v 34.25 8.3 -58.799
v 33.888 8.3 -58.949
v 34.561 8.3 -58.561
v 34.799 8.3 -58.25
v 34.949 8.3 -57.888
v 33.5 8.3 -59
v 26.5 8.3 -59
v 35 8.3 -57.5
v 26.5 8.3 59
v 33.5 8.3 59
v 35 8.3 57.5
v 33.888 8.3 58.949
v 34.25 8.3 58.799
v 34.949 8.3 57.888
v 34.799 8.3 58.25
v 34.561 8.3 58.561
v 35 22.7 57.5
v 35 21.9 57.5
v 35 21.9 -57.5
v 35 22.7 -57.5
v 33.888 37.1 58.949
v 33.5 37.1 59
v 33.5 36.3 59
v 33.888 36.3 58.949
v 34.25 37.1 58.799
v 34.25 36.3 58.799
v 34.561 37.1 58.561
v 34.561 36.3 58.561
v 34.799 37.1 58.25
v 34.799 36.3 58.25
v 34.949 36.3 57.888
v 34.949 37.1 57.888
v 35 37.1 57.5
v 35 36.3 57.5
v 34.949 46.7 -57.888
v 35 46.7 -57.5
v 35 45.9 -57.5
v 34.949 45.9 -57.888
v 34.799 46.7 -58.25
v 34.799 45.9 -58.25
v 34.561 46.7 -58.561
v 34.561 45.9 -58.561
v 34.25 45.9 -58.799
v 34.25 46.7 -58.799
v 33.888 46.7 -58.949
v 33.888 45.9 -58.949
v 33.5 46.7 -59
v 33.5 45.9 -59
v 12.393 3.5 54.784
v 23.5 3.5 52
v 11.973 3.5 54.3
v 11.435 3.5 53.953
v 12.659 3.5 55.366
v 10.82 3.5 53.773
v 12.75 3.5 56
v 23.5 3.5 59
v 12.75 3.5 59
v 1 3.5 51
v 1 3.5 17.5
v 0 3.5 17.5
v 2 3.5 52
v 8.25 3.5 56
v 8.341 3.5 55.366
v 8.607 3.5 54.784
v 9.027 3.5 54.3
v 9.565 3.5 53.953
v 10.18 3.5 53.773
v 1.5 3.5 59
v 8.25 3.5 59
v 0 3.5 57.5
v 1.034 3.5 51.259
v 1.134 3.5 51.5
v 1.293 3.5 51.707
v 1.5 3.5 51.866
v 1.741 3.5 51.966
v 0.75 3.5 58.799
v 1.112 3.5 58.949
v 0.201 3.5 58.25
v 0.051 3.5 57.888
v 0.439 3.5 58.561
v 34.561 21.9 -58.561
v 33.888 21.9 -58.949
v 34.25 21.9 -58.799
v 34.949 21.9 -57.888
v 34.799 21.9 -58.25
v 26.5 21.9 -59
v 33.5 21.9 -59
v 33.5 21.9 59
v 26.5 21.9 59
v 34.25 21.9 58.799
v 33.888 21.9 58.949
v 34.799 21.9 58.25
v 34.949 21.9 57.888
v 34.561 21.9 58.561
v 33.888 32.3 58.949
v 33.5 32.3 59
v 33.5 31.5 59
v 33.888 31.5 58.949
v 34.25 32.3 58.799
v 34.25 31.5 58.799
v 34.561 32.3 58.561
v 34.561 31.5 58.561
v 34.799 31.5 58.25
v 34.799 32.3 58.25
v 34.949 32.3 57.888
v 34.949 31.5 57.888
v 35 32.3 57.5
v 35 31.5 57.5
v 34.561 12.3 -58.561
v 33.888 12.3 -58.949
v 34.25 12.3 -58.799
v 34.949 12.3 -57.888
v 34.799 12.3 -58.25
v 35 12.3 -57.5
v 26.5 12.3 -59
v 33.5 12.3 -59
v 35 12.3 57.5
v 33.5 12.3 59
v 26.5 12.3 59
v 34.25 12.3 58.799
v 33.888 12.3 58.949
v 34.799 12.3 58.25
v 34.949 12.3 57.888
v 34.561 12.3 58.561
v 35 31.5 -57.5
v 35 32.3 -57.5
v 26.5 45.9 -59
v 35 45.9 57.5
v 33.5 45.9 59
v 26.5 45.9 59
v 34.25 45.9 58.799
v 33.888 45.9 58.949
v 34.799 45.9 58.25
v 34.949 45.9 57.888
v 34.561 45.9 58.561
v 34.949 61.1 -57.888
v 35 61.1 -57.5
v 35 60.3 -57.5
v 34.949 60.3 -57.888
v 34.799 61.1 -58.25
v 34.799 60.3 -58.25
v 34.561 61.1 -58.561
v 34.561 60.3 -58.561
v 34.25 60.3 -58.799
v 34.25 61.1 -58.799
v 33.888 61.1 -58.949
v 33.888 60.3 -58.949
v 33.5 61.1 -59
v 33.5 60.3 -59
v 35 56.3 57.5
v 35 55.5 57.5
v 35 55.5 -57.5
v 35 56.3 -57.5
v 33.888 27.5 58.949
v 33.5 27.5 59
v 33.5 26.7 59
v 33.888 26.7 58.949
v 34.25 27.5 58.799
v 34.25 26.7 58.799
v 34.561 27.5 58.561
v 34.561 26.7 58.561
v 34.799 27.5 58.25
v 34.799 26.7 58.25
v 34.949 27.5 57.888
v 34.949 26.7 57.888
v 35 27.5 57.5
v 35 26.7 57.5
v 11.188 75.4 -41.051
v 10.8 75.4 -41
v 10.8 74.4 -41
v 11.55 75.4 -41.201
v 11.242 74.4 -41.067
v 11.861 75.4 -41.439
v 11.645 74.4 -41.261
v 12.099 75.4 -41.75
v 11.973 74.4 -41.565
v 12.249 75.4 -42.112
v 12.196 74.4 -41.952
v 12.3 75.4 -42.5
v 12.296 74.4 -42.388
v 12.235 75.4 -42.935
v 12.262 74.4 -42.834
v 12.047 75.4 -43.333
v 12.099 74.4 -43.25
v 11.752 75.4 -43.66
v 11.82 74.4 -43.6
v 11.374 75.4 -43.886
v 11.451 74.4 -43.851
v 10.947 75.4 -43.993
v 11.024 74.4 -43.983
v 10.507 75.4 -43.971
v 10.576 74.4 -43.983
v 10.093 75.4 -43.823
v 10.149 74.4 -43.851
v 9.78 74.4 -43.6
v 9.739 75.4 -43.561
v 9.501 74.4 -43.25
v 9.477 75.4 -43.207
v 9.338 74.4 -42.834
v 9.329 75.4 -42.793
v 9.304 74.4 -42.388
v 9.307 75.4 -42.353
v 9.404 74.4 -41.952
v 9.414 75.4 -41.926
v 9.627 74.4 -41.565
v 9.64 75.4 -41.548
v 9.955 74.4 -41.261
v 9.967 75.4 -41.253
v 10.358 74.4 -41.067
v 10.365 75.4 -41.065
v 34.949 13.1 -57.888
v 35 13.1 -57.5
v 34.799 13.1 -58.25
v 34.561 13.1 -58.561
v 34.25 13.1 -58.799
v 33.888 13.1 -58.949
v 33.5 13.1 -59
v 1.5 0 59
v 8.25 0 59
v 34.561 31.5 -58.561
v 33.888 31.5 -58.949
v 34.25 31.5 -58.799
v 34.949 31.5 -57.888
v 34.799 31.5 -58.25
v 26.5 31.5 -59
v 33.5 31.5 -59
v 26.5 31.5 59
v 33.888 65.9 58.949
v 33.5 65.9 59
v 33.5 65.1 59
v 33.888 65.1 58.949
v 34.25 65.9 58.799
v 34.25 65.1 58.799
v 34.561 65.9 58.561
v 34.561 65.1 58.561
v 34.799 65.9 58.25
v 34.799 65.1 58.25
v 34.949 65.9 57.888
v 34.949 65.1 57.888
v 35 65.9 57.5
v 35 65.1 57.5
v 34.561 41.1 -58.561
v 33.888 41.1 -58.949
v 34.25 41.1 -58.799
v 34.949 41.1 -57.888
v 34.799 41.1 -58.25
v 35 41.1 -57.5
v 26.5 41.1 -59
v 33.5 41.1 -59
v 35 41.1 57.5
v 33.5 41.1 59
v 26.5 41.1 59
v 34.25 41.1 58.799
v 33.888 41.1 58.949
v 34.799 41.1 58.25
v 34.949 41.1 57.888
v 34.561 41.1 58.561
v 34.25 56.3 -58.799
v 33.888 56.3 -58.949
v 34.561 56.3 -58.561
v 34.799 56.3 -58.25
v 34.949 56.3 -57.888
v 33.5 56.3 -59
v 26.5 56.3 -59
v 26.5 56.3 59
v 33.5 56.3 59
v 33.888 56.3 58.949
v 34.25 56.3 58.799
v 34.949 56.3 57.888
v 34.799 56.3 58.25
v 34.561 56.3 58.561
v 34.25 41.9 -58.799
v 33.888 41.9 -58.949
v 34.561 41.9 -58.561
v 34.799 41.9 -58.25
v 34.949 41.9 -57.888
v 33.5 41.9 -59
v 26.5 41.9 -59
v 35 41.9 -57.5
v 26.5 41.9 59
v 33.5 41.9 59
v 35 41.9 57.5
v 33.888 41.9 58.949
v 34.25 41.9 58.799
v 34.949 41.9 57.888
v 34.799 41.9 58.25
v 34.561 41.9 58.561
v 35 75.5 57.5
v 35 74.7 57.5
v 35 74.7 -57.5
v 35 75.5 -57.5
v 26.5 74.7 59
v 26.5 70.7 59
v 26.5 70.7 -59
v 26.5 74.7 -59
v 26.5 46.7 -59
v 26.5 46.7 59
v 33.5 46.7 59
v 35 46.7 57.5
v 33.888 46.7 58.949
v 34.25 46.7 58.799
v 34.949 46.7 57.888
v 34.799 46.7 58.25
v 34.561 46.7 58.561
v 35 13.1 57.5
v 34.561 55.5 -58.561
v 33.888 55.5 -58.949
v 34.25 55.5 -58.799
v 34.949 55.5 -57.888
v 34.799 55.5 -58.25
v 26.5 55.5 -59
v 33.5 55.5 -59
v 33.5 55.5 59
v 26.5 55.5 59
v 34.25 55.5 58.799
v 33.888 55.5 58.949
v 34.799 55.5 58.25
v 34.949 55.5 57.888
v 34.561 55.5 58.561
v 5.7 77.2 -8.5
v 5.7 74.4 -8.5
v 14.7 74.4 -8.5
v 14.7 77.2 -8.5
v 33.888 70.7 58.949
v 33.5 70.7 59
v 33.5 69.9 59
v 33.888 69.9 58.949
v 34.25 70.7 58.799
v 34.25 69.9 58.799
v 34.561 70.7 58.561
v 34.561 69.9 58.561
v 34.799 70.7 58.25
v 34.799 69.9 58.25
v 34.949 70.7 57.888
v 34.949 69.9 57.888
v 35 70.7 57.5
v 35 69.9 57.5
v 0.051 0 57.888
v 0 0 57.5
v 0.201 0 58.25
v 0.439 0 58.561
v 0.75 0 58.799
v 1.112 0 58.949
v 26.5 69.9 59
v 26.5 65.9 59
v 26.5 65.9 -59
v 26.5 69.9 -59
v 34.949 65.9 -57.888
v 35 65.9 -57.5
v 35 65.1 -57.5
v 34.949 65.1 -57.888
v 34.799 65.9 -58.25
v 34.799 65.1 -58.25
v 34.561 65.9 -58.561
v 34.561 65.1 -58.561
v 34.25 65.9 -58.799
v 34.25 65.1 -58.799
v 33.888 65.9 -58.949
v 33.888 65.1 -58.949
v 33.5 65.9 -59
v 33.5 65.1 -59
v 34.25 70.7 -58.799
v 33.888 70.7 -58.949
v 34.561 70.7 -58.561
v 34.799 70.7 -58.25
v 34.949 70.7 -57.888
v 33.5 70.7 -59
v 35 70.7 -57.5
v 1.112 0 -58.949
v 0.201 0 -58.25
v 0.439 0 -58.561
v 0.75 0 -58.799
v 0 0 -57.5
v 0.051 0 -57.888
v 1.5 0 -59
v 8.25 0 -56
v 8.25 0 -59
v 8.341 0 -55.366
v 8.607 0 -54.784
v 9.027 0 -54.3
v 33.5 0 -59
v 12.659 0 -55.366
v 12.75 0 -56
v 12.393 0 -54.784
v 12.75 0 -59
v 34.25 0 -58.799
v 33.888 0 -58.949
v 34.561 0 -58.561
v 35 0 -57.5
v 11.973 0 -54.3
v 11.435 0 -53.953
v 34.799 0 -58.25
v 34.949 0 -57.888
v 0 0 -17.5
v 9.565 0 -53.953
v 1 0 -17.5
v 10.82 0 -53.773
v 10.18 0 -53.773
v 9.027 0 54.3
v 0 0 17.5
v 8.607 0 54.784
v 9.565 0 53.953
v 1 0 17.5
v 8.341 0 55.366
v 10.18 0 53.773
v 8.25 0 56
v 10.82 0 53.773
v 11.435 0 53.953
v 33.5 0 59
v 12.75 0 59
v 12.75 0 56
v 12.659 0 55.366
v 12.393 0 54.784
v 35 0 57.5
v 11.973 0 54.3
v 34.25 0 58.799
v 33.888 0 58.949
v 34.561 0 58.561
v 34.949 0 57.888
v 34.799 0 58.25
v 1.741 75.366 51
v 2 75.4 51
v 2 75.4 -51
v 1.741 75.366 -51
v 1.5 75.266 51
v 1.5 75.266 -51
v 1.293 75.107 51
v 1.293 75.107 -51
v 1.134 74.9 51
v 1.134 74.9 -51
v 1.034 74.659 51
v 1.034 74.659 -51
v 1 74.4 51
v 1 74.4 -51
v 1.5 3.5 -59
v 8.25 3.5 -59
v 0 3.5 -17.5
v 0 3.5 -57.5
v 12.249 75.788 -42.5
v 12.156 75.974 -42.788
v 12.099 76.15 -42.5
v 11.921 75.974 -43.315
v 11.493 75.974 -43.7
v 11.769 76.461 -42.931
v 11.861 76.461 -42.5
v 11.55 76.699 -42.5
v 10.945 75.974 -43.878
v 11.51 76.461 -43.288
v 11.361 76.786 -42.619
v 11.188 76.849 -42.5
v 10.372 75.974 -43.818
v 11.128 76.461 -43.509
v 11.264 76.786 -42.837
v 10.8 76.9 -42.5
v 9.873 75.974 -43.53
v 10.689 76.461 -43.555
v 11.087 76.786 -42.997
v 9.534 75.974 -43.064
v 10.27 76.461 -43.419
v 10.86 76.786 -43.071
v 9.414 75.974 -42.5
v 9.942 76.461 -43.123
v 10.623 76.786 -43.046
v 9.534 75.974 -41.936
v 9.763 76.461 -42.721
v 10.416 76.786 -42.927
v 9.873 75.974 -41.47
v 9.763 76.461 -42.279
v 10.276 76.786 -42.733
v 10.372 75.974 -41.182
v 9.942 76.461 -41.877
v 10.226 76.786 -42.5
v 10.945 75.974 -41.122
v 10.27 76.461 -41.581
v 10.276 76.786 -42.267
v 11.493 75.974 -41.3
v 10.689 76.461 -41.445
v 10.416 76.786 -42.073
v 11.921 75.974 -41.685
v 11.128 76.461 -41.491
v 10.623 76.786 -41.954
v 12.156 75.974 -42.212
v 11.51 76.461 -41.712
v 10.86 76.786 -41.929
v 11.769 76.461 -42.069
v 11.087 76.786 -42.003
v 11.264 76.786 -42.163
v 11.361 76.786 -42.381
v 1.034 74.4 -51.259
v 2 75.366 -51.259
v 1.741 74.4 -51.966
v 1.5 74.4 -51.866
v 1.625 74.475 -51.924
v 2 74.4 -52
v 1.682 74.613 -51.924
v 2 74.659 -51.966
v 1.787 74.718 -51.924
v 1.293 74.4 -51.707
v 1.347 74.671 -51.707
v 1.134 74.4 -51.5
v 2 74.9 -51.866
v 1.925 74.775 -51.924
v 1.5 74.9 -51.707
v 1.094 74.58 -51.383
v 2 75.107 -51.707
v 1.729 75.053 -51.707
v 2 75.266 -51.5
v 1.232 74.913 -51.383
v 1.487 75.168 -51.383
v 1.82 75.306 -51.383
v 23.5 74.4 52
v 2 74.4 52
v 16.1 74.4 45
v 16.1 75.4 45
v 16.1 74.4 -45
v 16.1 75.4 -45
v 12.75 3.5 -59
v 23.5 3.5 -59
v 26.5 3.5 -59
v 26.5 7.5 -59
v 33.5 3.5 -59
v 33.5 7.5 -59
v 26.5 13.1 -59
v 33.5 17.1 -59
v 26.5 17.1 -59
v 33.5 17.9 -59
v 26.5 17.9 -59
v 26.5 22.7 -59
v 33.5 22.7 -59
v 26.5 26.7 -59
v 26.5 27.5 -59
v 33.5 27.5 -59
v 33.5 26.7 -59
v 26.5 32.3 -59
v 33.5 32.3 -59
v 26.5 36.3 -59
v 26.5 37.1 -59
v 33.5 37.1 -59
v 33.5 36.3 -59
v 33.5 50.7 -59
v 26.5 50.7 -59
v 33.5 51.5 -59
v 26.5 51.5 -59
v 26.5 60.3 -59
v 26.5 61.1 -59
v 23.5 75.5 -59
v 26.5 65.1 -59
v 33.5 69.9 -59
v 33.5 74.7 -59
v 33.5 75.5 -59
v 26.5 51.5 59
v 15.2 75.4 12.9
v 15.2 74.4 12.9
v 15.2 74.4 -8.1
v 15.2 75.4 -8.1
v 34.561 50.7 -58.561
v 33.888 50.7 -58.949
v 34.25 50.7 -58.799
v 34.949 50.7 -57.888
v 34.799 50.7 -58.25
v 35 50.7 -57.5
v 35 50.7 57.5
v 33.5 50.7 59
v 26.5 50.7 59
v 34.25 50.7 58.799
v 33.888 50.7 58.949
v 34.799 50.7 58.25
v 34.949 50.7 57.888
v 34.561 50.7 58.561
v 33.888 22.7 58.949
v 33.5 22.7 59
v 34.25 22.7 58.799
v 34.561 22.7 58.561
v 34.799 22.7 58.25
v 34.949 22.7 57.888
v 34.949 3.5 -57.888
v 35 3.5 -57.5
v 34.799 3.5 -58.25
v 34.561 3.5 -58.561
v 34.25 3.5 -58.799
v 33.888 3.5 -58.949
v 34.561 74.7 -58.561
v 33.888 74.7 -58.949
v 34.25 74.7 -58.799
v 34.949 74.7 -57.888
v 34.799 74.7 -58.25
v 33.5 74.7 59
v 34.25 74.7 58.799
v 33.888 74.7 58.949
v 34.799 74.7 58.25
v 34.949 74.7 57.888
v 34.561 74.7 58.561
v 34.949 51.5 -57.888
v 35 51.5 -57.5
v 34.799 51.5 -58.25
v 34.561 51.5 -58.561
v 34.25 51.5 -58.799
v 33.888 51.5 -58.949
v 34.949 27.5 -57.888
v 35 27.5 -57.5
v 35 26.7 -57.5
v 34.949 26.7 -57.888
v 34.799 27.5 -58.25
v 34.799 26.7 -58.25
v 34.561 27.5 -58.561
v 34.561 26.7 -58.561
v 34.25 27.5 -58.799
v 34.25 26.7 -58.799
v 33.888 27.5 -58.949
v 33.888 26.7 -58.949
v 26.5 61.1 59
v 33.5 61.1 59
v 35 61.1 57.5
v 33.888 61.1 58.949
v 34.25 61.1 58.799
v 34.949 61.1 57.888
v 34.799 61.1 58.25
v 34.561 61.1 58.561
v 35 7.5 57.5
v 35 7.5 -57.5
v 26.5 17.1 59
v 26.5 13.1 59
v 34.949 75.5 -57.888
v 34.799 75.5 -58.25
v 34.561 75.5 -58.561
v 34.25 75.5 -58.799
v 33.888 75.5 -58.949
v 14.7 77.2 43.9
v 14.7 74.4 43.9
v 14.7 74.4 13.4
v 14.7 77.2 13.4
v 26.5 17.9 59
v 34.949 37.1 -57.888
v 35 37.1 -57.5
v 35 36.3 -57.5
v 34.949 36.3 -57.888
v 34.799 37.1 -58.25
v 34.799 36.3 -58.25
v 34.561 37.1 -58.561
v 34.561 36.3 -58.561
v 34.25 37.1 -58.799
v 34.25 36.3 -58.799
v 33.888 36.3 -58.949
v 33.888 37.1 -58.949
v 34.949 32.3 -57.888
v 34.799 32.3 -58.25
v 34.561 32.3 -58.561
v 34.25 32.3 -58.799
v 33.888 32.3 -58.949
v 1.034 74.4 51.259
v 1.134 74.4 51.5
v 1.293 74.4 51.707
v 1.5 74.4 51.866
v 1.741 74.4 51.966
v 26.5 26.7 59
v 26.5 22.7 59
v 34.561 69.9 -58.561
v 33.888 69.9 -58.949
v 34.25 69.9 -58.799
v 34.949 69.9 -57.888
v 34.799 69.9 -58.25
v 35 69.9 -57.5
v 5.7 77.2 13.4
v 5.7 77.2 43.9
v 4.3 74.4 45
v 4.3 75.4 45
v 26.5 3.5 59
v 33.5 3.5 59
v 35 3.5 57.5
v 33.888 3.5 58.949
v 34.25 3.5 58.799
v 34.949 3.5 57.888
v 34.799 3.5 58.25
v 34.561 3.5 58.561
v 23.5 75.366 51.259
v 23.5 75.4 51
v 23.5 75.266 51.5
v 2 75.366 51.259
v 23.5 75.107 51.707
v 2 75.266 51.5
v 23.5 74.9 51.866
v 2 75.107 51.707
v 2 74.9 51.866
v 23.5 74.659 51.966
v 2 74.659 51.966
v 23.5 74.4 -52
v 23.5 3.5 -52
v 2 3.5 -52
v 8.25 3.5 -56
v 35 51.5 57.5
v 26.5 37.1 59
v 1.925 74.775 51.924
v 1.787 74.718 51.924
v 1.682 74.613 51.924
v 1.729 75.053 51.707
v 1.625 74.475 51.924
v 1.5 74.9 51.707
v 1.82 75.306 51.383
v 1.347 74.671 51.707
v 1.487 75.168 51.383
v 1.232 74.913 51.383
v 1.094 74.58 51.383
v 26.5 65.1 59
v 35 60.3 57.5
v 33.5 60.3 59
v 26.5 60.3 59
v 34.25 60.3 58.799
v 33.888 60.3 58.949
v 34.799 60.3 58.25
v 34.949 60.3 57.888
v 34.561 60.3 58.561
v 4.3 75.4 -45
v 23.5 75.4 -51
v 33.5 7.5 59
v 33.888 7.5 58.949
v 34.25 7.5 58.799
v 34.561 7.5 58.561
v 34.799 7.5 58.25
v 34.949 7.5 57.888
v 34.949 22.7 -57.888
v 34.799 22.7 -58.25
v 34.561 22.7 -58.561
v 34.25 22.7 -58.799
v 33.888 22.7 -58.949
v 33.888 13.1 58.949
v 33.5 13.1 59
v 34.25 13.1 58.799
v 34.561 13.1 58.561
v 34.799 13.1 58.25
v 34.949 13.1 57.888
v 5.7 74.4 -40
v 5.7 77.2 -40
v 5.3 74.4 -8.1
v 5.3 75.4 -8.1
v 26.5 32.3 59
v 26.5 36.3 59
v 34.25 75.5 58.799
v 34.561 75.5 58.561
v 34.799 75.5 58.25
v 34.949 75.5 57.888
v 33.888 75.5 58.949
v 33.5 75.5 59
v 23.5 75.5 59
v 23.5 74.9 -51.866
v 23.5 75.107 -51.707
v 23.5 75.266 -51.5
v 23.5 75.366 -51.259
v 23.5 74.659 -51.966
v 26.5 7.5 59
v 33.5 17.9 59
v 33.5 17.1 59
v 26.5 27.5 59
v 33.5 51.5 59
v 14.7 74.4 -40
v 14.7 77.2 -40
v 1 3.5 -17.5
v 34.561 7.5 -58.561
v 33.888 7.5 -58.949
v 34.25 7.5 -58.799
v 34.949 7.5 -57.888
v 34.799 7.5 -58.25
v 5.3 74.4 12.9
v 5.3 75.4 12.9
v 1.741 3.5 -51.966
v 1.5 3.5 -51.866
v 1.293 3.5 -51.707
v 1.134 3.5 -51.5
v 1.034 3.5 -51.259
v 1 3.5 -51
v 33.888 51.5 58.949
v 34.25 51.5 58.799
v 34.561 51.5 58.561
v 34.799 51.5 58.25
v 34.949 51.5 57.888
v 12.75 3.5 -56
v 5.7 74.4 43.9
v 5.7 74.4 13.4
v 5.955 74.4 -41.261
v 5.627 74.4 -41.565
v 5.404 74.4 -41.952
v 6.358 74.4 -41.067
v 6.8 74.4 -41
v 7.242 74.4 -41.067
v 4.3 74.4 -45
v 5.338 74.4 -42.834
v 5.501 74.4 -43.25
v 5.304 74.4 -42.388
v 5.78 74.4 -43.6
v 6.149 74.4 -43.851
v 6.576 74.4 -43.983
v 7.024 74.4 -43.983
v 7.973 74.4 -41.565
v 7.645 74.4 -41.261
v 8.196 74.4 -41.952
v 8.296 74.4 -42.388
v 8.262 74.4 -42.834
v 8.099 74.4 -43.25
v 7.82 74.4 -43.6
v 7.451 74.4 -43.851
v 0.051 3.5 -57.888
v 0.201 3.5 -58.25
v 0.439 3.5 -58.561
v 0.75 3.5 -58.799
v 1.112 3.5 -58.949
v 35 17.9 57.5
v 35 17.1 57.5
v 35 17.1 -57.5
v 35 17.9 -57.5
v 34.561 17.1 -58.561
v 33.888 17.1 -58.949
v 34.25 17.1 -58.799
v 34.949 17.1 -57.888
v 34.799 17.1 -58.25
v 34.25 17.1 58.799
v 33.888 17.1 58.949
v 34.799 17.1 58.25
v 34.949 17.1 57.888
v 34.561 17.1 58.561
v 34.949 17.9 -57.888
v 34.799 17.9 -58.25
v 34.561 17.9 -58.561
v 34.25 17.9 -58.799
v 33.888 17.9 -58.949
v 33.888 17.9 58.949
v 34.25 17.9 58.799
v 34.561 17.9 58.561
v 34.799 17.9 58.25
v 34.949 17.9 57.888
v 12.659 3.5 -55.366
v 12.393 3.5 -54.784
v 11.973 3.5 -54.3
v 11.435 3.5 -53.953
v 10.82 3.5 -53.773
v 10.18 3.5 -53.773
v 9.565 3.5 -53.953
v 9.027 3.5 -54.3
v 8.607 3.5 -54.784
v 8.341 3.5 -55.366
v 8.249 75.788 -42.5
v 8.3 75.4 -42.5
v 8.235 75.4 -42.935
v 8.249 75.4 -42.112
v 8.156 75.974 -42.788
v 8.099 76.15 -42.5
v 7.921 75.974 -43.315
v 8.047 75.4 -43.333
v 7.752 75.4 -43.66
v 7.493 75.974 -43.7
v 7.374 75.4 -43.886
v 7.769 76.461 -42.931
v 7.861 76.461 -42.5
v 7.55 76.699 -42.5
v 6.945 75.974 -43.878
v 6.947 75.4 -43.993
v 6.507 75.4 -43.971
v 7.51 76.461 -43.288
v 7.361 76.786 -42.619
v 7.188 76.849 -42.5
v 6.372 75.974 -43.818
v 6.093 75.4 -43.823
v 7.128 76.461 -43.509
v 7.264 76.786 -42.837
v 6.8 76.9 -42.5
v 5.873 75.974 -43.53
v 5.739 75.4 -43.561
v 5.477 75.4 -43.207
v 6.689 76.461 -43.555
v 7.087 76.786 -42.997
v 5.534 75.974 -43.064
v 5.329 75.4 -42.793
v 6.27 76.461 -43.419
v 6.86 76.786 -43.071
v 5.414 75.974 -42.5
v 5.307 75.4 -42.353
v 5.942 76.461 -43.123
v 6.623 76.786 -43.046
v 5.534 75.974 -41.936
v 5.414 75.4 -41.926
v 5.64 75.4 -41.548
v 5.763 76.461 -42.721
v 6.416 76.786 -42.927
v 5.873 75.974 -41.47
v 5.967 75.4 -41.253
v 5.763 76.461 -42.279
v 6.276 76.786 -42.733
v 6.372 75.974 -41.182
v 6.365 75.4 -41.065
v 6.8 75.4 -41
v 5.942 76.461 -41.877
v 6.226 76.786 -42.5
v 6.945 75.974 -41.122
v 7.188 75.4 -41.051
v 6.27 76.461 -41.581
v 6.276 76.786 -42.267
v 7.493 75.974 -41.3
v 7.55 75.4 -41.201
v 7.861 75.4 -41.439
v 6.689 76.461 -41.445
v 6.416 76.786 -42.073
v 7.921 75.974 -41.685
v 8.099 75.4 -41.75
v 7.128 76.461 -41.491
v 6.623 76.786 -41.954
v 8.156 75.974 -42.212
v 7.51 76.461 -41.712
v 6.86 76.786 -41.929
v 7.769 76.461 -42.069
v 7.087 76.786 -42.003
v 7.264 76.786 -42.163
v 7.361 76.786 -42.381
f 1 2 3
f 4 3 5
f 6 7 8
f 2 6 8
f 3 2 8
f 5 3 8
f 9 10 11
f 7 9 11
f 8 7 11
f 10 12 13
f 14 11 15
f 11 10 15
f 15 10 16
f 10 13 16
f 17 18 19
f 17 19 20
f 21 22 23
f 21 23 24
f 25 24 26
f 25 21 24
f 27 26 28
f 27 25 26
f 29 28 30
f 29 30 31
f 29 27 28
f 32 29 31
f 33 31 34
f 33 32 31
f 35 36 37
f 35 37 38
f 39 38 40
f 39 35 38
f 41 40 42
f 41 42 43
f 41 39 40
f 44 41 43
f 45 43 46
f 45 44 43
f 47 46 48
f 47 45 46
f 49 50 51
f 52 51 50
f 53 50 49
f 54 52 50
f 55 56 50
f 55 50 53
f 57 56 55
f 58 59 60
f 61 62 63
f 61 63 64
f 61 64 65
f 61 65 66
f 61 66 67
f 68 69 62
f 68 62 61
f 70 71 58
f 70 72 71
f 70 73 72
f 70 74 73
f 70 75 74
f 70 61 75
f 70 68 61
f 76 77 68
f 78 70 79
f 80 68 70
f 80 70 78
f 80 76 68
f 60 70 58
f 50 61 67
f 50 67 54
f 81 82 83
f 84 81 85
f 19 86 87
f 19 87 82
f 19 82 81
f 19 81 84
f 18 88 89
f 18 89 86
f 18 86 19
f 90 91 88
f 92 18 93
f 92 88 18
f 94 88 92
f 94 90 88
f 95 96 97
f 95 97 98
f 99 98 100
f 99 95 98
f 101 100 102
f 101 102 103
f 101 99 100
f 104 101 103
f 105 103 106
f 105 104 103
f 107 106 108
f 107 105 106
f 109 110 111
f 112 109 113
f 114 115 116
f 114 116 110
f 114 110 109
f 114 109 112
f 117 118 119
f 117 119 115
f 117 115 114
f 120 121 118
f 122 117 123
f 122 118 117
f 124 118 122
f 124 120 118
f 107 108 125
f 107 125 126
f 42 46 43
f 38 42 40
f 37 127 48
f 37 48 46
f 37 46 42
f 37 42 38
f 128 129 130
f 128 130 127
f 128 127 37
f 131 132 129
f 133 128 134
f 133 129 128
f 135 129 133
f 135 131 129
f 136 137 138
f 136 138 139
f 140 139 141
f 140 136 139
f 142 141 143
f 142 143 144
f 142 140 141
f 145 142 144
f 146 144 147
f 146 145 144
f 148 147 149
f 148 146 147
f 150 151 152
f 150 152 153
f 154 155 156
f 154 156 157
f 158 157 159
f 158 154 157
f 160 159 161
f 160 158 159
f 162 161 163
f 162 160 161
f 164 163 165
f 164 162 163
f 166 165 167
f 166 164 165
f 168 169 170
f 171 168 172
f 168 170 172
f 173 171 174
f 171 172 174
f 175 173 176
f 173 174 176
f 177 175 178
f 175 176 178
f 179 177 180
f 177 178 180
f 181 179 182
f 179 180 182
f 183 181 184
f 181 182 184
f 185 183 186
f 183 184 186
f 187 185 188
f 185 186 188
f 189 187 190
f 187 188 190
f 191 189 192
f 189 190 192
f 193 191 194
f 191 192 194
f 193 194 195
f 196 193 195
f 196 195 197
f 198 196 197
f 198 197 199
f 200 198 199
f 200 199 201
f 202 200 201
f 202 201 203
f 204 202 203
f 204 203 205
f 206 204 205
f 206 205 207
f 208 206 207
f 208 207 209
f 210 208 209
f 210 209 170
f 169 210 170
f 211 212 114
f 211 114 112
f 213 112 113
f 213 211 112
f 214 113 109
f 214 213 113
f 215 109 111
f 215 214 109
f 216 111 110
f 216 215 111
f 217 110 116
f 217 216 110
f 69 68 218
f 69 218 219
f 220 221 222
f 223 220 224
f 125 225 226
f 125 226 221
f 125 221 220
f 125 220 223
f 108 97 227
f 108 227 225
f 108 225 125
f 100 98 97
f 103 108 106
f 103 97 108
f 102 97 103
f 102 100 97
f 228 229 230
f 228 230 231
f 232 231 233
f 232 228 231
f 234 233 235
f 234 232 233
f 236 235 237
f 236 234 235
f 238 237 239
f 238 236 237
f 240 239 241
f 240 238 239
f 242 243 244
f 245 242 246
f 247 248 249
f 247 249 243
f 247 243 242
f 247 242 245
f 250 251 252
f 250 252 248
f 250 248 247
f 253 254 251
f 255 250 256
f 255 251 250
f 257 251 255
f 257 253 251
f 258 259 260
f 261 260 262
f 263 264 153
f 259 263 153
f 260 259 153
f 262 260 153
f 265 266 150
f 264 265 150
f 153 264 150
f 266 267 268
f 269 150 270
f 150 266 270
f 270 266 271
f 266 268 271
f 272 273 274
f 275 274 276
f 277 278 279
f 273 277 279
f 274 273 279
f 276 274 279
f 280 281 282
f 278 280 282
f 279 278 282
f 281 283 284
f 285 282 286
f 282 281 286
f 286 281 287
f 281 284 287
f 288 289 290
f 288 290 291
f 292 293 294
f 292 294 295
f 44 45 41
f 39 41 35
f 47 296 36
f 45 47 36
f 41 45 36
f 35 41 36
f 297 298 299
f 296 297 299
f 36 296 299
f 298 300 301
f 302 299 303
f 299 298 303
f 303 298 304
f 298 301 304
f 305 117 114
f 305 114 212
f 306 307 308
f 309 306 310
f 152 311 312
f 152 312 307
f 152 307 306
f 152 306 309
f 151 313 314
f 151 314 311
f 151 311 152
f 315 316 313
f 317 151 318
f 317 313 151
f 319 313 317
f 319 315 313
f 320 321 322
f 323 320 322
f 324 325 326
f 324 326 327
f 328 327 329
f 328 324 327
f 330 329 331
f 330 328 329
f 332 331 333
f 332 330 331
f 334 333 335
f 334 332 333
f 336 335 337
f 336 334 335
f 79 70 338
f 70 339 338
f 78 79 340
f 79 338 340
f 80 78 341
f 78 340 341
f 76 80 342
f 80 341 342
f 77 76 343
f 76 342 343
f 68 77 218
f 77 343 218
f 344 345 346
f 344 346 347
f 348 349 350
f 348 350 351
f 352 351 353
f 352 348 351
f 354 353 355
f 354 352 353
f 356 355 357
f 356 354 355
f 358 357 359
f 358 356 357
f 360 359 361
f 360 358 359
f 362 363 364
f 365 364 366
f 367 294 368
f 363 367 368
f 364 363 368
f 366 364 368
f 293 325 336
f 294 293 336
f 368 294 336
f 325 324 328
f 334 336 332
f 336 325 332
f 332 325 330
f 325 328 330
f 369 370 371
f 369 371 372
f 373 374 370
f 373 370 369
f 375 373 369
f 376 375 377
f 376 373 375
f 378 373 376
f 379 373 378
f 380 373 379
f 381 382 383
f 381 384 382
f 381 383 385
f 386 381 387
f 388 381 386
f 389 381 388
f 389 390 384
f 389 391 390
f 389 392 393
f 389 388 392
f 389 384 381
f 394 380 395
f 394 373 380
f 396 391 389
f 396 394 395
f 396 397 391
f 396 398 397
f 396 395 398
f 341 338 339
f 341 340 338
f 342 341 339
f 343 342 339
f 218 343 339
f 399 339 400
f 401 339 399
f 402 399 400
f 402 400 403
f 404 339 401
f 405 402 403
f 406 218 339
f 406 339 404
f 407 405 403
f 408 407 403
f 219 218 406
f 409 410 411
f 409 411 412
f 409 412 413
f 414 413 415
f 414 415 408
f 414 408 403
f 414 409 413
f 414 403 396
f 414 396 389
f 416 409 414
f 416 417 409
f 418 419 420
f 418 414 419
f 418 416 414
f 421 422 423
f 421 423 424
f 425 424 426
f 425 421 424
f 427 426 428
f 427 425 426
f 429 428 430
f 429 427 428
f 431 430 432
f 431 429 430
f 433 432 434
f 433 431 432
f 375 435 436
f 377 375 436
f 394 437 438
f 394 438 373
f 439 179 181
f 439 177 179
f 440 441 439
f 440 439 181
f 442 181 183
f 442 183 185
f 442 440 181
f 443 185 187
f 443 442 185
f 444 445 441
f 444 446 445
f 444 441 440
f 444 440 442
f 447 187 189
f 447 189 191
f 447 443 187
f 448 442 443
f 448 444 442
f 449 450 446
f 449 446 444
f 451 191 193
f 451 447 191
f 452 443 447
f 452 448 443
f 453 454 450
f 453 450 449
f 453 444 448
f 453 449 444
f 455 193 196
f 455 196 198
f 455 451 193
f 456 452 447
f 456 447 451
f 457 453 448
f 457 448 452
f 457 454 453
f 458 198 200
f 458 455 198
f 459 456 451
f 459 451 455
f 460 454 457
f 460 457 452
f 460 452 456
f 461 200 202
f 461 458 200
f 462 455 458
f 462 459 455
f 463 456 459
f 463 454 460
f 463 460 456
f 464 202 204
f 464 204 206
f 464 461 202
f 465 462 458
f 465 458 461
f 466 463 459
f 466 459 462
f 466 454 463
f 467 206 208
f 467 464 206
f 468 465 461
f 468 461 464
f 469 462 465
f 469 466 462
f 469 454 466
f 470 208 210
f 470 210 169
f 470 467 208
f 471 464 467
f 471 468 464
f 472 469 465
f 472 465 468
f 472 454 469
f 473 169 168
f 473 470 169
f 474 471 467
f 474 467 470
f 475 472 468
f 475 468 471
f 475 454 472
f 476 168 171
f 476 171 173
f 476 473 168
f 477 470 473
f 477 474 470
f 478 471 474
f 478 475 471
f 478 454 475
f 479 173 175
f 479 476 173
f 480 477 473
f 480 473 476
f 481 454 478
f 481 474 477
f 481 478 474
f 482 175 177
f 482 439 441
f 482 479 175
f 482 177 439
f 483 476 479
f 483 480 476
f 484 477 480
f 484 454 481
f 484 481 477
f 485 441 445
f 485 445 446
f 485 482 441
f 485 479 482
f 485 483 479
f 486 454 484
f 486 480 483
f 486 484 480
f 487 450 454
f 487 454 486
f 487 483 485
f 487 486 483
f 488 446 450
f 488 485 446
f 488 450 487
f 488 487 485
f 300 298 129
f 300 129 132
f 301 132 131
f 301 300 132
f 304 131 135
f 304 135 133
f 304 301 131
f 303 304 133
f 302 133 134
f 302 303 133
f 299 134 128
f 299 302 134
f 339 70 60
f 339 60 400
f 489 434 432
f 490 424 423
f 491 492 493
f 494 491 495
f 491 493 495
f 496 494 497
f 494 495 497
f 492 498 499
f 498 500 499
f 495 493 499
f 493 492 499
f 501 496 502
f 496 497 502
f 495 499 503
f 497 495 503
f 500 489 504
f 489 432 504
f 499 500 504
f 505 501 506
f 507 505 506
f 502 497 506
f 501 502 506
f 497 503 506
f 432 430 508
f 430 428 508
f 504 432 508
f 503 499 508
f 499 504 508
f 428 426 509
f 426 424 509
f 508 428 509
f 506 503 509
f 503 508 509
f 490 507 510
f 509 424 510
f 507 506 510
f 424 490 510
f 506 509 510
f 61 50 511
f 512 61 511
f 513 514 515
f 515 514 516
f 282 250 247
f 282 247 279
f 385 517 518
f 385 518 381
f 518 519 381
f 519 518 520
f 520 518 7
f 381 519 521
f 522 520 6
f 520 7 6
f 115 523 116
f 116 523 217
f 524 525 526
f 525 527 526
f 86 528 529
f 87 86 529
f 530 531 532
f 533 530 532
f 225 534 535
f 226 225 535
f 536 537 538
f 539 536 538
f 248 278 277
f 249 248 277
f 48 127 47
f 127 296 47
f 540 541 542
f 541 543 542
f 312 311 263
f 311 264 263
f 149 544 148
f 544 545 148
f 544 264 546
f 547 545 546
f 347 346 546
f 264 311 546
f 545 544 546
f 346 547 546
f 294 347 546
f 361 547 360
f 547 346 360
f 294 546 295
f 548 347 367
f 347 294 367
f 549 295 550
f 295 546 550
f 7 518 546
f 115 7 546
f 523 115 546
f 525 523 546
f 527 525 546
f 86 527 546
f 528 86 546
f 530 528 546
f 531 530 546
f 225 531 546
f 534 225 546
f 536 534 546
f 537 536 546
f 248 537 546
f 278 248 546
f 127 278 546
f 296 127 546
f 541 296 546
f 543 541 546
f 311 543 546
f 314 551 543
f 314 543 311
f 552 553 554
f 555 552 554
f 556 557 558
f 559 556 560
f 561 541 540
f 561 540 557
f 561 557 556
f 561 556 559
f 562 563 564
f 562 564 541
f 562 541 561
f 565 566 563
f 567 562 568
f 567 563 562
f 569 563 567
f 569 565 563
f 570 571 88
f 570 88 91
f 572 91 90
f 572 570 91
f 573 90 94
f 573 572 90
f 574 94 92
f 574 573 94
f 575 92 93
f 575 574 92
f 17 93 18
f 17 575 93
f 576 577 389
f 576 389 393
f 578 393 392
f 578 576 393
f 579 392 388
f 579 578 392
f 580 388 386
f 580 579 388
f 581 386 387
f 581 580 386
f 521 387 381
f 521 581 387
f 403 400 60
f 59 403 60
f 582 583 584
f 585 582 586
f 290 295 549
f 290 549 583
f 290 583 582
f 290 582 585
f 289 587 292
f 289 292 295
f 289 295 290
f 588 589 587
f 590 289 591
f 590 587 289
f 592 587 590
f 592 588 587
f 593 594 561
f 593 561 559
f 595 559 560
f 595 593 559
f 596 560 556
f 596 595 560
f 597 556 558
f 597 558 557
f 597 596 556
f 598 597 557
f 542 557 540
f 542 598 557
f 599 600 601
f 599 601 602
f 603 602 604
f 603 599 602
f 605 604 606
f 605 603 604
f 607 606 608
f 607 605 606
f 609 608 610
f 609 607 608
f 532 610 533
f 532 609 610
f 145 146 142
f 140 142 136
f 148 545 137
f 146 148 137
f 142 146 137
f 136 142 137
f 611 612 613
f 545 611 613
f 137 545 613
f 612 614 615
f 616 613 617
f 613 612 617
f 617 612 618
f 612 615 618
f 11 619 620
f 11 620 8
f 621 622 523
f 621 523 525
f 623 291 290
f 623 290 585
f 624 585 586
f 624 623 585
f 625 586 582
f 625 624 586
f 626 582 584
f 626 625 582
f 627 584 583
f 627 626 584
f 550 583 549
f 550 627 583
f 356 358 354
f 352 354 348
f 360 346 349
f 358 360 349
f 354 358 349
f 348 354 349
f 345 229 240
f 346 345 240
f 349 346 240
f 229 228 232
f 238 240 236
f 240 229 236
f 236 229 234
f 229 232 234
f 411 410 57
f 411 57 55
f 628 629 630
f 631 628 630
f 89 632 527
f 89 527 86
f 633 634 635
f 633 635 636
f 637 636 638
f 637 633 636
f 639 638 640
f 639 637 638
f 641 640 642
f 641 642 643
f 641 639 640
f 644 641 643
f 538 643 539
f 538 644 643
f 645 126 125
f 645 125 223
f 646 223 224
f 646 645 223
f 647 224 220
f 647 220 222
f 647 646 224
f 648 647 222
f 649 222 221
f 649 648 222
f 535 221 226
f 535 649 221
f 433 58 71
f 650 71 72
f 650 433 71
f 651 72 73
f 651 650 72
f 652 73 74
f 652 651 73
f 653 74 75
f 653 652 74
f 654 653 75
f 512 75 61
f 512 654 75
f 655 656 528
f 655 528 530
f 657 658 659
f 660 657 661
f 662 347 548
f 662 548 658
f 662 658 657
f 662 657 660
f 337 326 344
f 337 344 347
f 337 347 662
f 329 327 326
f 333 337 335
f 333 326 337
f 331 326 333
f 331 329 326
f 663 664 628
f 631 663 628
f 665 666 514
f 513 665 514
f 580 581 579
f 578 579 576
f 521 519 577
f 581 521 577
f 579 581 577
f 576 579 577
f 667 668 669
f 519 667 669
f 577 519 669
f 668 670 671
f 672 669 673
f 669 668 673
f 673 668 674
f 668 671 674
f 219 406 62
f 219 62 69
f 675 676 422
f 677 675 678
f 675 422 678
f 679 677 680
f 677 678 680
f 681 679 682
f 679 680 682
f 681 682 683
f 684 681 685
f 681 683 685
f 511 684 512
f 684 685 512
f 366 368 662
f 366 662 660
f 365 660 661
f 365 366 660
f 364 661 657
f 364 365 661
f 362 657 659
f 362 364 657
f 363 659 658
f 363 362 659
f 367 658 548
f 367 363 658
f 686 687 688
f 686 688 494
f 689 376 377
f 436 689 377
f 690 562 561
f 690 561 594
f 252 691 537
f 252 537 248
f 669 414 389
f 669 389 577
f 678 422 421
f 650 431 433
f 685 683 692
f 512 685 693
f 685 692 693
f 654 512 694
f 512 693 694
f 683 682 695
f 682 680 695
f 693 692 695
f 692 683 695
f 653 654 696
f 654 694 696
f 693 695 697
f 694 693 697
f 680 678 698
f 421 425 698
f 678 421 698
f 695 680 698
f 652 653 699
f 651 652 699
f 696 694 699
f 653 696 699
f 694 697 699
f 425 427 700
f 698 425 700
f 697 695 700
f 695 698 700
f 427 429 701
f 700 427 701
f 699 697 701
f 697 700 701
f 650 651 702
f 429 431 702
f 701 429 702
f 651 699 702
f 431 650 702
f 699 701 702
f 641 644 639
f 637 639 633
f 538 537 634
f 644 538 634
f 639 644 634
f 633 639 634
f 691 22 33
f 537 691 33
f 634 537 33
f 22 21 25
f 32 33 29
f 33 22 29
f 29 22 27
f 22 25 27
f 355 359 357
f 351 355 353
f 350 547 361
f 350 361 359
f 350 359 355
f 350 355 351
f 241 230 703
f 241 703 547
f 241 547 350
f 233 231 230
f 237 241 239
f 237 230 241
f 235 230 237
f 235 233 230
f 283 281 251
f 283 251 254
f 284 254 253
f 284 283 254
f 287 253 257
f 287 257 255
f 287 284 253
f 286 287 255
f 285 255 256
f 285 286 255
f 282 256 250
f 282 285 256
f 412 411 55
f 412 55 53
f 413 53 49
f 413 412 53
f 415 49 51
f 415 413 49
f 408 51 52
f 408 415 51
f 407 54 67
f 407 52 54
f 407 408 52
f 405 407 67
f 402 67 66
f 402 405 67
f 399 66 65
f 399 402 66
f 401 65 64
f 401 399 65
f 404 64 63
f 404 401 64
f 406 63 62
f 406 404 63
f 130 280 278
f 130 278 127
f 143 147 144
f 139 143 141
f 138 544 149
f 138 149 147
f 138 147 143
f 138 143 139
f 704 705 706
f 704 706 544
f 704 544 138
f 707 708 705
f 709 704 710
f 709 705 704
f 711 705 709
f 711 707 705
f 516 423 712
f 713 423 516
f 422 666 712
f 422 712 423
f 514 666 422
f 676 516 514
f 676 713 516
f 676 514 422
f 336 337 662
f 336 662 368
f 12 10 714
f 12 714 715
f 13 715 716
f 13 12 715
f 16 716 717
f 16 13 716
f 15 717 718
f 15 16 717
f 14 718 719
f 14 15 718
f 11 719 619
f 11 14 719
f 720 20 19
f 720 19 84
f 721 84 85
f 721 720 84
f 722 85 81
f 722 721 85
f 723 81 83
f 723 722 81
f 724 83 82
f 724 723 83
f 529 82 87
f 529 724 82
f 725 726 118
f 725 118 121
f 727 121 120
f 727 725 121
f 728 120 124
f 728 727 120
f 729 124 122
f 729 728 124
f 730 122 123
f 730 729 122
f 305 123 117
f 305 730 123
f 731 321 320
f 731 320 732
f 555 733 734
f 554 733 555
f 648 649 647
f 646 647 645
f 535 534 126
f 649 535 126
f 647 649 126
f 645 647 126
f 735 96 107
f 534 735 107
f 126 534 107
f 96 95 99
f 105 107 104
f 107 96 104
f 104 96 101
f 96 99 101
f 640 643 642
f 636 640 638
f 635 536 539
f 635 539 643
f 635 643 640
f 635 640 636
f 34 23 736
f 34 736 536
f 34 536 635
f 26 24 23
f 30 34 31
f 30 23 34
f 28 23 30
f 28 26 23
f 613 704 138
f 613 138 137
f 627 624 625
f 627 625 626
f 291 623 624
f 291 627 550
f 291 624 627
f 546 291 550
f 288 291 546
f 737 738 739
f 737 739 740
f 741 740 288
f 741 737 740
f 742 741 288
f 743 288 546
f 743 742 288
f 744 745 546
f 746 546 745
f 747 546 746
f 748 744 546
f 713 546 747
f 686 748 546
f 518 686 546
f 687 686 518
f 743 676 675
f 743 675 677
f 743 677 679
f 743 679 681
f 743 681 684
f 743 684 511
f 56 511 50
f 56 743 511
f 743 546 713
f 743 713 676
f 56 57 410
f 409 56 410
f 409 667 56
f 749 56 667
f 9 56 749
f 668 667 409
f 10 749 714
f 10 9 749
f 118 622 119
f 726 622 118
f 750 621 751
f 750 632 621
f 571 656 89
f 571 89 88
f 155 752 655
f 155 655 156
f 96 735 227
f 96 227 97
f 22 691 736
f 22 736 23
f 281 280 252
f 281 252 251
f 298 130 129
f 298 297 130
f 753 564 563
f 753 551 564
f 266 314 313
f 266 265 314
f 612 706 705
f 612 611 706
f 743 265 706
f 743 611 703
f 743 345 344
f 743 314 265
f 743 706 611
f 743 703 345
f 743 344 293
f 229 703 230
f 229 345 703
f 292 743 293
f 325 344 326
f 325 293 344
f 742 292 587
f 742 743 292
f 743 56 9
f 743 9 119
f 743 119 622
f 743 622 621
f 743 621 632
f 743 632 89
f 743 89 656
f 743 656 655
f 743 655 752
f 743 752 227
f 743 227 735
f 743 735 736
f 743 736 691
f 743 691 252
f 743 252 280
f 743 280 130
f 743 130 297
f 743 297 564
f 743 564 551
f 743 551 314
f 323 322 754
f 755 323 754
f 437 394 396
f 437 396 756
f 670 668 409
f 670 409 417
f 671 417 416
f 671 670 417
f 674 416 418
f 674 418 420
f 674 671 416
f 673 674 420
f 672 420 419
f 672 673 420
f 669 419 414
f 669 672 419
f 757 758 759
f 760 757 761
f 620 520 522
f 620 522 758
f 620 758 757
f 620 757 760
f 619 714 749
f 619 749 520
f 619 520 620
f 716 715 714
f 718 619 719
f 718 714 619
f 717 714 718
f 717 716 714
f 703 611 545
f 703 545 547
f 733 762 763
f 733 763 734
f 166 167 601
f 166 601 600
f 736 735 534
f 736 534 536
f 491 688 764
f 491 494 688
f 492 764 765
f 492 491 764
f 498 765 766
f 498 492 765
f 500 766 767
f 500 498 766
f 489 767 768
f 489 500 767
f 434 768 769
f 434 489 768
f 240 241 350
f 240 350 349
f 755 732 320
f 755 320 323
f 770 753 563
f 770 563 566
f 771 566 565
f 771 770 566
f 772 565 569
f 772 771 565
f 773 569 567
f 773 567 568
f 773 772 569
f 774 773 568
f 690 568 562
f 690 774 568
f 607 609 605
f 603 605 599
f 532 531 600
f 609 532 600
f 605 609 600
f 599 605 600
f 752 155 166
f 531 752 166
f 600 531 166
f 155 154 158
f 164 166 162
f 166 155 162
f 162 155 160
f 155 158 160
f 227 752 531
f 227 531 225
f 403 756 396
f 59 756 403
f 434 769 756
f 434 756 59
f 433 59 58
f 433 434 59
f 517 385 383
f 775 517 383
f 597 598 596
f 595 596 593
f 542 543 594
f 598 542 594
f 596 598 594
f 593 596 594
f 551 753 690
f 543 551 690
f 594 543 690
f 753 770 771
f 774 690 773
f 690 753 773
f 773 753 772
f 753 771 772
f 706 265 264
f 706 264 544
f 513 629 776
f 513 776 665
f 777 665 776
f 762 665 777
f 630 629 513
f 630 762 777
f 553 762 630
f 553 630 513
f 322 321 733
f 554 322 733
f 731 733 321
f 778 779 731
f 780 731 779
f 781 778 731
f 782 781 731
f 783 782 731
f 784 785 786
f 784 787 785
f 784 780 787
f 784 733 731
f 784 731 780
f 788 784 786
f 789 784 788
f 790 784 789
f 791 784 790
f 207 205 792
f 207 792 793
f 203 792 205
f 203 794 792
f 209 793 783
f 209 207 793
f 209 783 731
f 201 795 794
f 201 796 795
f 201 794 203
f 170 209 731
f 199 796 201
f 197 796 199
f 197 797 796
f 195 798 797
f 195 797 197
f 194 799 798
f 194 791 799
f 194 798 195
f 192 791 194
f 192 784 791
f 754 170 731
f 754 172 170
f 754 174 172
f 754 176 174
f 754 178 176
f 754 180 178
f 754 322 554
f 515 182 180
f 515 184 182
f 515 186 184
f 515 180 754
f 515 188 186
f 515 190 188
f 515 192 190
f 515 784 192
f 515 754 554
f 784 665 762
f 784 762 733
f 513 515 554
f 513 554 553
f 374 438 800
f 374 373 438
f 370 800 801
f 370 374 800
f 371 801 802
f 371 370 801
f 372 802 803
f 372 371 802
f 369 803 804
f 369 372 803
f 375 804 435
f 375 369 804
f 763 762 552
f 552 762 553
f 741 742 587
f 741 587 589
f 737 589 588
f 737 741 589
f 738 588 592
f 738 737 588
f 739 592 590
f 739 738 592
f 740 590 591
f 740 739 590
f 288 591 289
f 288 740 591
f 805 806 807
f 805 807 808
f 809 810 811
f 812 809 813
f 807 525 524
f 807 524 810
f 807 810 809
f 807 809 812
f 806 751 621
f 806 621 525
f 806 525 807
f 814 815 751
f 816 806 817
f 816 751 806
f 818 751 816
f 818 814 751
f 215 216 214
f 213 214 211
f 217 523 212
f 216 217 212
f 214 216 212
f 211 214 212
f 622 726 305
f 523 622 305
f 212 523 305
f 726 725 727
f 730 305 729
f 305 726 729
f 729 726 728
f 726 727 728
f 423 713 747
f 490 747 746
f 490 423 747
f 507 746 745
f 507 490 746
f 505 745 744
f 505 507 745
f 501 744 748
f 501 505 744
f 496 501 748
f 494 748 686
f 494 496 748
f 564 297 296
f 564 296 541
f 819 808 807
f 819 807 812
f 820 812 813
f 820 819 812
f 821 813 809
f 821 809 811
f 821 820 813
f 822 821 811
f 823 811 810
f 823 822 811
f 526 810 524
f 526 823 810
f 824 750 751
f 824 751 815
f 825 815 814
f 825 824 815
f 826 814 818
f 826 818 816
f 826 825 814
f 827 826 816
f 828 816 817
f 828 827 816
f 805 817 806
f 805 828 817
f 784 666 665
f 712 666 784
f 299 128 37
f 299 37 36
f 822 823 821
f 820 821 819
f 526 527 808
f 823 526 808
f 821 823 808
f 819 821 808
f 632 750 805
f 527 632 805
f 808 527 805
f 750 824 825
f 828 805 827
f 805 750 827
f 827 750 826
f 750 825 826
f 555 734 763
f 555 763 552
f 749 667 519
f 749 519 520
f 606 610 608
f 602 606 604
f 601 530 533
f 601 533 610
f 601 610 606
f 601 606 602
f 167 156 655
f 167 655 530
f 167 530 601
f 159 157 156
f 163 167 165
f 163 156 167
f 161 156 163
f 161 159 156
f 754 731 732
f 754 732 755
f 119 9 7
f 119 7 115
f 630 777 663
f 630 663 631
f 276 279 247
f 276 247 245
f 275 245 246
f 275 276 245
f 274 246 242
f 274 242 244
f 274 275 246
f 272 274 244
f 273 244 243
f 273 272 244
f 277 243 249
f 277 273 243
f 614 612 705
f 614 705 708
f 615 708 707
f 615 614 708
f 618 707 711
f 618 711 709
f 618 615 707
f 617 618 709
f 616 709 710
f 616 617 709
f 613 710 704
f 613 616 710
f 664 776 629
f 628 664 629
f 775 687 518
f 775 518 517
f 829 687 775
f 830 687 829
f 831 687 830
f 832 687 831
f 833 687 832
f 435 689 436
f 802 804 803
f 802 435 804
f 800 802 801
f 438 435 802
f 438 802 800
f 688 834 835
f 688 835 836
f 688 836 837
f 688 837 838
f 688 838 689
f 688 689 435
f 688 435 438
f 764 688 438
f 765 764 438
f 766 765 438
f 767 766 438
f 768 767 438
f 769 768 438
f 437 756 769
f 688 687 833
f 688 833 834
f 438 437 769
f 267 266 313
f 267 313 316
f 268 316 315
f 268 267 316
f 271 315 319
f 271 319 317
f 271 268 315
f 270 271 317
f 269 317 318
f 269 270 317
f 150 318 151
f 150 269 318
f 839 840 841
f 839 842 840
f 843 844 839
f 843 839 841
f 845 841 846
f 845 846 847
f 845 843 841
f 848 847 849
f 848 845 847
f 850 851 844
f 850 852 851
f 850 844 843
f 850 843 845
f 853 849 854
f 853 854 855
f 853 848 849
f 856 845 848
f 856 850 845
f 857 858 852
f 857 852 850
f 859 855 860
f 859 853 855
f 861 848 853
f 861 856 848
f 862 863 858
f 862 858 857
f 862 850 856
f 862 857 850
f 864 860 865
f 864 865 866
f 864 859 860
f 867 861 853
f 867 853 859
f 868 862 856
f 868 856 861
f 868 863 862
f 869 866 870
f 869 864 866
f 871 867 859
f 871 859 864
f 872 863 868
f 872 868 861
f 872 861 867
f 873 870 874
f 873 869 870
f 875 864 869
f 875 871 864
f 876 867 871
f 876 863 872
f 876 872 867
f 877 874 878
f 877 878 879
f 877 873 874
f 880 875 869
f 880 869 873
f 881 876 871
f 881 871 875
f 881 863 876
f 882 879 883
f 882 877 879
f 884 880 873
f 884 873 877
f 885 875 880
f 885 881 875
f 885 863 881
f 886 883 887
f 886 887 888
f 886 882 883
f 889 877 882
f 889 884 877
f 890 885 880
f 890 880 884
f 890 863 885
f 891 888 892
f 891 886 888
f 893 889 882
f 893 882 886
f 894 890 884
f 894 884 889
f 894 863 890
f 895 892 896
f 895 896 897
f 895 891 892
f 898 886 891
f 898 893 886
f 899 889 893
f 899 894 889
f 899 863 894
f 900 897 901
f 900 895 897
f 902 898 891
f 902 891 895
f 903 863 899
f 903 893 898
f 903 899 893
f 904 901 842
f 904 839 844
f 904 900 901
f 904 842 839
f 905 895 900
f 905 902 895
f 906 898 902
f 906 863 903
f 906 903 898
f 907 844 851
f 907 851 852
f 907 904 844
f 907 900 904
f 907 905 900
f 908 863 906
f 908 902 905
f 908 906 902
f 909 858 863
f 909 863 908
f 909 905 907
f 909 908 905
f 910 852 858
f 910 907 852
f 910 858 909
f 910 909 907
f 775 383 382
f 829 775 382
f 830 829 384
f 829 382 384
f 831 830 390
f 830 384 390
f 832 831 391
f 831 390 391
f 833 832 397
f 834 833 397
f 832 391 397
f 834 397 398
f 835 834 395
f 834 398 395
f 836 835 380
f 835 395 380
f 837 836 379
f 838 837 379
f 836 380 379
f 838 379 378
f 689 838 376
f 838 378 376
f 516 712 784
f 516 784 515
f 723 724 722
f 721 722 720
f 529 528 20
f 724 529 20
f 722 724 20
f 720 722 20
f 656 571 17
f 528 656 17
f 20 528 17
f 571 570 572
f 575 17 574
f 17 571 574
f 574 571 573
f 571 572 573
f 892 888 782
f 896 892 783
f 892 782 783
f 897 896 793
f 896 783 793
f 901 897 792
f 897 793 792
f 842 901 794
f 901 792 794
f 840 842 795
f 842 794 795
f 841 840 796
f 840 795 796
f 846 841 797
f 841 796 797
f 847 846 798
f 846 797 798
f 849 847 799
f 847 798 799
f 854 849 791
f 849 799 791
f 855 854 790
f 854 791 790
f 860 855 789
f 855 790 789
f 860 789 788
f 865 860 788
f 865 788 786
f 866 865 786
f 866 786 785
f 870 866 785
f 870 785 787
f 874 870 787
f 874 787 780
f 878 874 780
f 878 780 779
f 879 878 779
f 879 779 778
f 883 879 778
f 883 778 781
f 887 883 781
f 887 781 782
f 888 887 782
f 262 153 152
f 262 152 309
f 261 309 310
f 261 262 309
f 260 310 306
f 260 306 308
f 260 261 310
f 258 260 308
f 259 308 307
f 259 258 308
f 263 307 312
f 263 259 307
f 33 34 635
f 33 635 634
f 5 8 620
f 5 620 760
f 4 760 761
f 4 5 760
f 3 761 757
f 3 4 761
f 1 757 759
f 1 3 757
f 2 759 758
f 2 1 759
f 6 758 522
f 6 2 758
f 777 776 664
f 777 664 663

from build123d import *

# Parameters (mm, degrees)
BOSS_EXTRUDE1_DEPTH = 59
FILLET1_R           = 1.5
SKETCH2_W           = 8.5
SKETCH2_H           = 4
CUT_EXTRUDE1_DEPTH  = 145.392693721
LPATTERN1_COUNT     = 15
LPATTERN1_PITCH     = 4.8
SKETCH3_W           = 104
SKETCH3_H           = 71.9
BOSS_EXTRUDE2_DEPTH = 22.5
SKETCH4_W           = 35
SKETCH4_H           = 3.5
CUT_EXTRUDE2_DEPTH  = 1
CUT_EXTRUDE3_REACH  = 104.011
SKETCH8_W           = 11.8
SKETCH8_H           = 90
CUT_EXTRUDE4_DEPTH  = 1
SKETCH9_W           = 9
SKETCH9_H           = 30.5
SKETCH9_H_2         = 31.5
BOSS_EXTRUDE4_DEPTH = 2.8
SKETCH10_W          = 9.9
SKETCH10_H          = 21
BOSS_EXTRUDE5_DEPTH = 1
SKETCH11_R          = 1.5
BOSS_EXTRUDE6_DEPTH = 1
FILLET2_R           = 1


# Read off the part's stored shape, not the designer's step: Dome1, Dome2
with BuildPart() as part:
    # Sketch1 → Boss-Extrude1 (new, symmetric)
    with BuildSketch(Plane.XY):
        Polygon((0, 0), (35, 0), (35, 75.5), (23.5, 75.5), (23.5, 3.5), (0, 3.5), align=None)
    extrude(amount=BOSS_EXTRUDE1_DEPTH, both=True)

    # Fillet1
    fillet1_edges = [part.edges().sort_by_distance(p)[0] for p in [
        (35, 37.75, 59),
        (0, 1.75, 59),
        (35, 37.75, -59),
        (0, 1.75, -59),
    ]]
    fillet(fillet1_edges, radius=FILLET1_R)

    # Sketch2 → Cut-Extrude1 (cut, through all)
    with BuildSketch(Plane.XY.offset(59)):
        with Locations((30.75, 5.5)):
            Rectangle(SKETCH2_W, SKETCH2_H)
    cut_extrude1 = extrude(amount=-CUT_EXTRUDE1_DEPTH, mode=Mode.SUBTRACT)

    # LPattern1: Cut-Extrude1 ×15
    with Locations(*[(0, i * LPATTERN1_PITCH, 0) for i in range(1, LPATTERN1_COUNT)]):
        add(cut_extrude1, mode=Mode.SUBTRACT)

    # Sketch3 → Boss-Extrude2 (add)
    with BuildSketch(Plane.ZY.offset(-23.5)):
        with Locations((0, 39.45)):
            Rectangle(SKETCH3_W, SKETCH3_H)
    extrude(amount=BOSS_EXTRUDE2_DEPTH)

    # Sketch4 → Cut-Extrude2 (cut)
    with BuildSketch(Plane.ZY):
        with Locations((0, 1.75)):
            Rectangle(SKETCH4_W, SKETCH4_H)
    extrude(amount=-CUT_EXTRUDE2_DEPTH, mode=Mode.SUBTRACT)

    # Sketch5 → Cut-Extrude3 (cut, up to next)
    with BuildSketch(Plane.XZ, mode=Mode.PRIVATE) as cut_extrude3_sk1:
        with BuildLine():
            Line((12.75, 59), (12.75, 56))
            ThreePointArc((12.75, 56), (10.5, 53.75), (8.25, 56))
            Line((8.25, 56), (8.25, 59))
            ThreePointArc((8.25, 59), (10.5, 61.25), (12.75, 59))
        make_face()
    cut_extrude3_tool1 = extrude(cut_extrude3_sk1.sketch, amount=-CUT_EXTRUDE3_REACH, mode=Mode.PRIVATE) & part.part
    # Sketch5 → Cut-Extrude3 (cut, up to next)
    with BuildSketch(Plane.XZ, mode=Mode.PRIVATE) as cut_extrude3_sk2:
        with BuildLine():
            Line((12.75, -59), (12.75, -56))
            ThreePointArc((12.75, -56), (10.5, -53.75), (8.25, -56))
            Line((8.25, -56), (8.25, -59))
            ThreePointArc((8.25, -59), (10.5, -61.25), (12.75, -59))
        make_face()
    cut_extrude3_tool2 = extrude(cut_extrude3_sk2.sketch, amount=-CUT_EXTRUDE3_REACH, mode=Mode.PRIVATE) & part.part
    add(cut_extrude3_tool1.solids().sort_by_distance((10.5, 0, 57.5))[0], mode=Mode.SUBTRACT)
    add(cut_extrude3_tool2.solids().sort_by_distance((10.5, 0, -57.5))[0], mode=Mode.SUBTRACT)

    # Sketch8 → Cut-Extrude4 (cut)
    with BuildSketch(Plane(origin=(0, 75.4, 0), x_dir=(1, 0, 0), z_dir=(0, 1, 0))):
        with Locations((10.2, 0)):
            Rectangle(SKETCH8_W, SKETCH8_H)
    extrude(amount=-CUT_EXTRUDE4_DEPTH, mode=Mode.SUBTRACT)

    # Sketch9 → Boss-Extrude4 (add)
    with BuildSketch(Plane(origin=(0, 74.4, 0), x_dir=(1, 0, 0), z_dir=(0, 1, 0))):
        with Locations((10.2, -28.65)):
            Rectangle(SKETCH9_W, SKETCH9_H)
        with Locations((10.2, 24.25)):
            Rectangle(SKETCH9_W, SKETCH9_H_2)
    extrude(amount=BOSS_EXTRUDE4_DEPTH)

    # Sketch10 → Boss-Extrude5 (add)
    with BuildSketch(Plane(origin=(0, 74.4, 0), x_dir=(1, 0, 0), z_dir=(0, 1, 0))):
        with Locations((10.25, -2.4)):
            Rectangle(SKETCH10_W, SKETCH10_H)
    extrude(amount=BOSS_EXTRUDE5_DEPTH)

    # Sketch11 → Boss-Extrude6 (add)
    with BuildSketch(Plane(origin=(0, 74.4, 0), x_dir=(1, 0, 0), z_dir=(0, 1, 0))):
        with Locations(Location((6.8, 42.5, 0), (0, 0, 270))):
            Circle(SKETCH11_R)
        with Locations(Location((10.8, 42.5, 0), (0, 0, 270))):
            Circle(SKETCH11_R)
    extrude(amount=BOSS_EXTRUDE6_DEPTH)

    # Dome1 outline → Dome1 (revolve)
    with BuildSketch(Plane(origin=(10.8, 0, -42.5), x_dir=(1, 0, 0), z_dir=(0, 0, 1))):
        with BuildLine():
            Line((0, 75.4), (1.5, 75.399999999))
            ThreePointArc((1.5, 75.399999999), (1.060660172, 76.460660171), (0, 76.9))
            Line((0, 76.9), (0, 75.4))
        make_face()
    revolve(axis=Axis((10.8, 0, -42.5), (0, 1, 0)))

    # Dome2 outline → Dome2 (revolve)
    with BuildSketch(Plane(origin=(6.8, 0, -42.5), x_dir=(1, 0, 0), z_dir=(0, 0, 1))):
        with BuildLine():
            Line((0, 75.4), (1.5, 75.399999999))
            ThreePointArc((1.5, 75.399999999), (1.060660172, 76.460660171), (0, 76.9))
            Line((0, 76.9), (0, 75.4))
        make_face()
    revolve(axis=Axis((6.8, 0, -42.5), (0, 1, 0)))

    # Fillet2
    fillet2_edges = [part.edges().sort_by_distance(p)[0] for p in [
        (1, 75.4, 0),
        (12.25, 75.4, 52),
        (1, 39.45, 52),
        (1, 39.45, -52),
        (12.25, 75.4, -52),
    ]]
    fillet(fillet2_edges, radius=FILLET2_R)


solid = part.part
